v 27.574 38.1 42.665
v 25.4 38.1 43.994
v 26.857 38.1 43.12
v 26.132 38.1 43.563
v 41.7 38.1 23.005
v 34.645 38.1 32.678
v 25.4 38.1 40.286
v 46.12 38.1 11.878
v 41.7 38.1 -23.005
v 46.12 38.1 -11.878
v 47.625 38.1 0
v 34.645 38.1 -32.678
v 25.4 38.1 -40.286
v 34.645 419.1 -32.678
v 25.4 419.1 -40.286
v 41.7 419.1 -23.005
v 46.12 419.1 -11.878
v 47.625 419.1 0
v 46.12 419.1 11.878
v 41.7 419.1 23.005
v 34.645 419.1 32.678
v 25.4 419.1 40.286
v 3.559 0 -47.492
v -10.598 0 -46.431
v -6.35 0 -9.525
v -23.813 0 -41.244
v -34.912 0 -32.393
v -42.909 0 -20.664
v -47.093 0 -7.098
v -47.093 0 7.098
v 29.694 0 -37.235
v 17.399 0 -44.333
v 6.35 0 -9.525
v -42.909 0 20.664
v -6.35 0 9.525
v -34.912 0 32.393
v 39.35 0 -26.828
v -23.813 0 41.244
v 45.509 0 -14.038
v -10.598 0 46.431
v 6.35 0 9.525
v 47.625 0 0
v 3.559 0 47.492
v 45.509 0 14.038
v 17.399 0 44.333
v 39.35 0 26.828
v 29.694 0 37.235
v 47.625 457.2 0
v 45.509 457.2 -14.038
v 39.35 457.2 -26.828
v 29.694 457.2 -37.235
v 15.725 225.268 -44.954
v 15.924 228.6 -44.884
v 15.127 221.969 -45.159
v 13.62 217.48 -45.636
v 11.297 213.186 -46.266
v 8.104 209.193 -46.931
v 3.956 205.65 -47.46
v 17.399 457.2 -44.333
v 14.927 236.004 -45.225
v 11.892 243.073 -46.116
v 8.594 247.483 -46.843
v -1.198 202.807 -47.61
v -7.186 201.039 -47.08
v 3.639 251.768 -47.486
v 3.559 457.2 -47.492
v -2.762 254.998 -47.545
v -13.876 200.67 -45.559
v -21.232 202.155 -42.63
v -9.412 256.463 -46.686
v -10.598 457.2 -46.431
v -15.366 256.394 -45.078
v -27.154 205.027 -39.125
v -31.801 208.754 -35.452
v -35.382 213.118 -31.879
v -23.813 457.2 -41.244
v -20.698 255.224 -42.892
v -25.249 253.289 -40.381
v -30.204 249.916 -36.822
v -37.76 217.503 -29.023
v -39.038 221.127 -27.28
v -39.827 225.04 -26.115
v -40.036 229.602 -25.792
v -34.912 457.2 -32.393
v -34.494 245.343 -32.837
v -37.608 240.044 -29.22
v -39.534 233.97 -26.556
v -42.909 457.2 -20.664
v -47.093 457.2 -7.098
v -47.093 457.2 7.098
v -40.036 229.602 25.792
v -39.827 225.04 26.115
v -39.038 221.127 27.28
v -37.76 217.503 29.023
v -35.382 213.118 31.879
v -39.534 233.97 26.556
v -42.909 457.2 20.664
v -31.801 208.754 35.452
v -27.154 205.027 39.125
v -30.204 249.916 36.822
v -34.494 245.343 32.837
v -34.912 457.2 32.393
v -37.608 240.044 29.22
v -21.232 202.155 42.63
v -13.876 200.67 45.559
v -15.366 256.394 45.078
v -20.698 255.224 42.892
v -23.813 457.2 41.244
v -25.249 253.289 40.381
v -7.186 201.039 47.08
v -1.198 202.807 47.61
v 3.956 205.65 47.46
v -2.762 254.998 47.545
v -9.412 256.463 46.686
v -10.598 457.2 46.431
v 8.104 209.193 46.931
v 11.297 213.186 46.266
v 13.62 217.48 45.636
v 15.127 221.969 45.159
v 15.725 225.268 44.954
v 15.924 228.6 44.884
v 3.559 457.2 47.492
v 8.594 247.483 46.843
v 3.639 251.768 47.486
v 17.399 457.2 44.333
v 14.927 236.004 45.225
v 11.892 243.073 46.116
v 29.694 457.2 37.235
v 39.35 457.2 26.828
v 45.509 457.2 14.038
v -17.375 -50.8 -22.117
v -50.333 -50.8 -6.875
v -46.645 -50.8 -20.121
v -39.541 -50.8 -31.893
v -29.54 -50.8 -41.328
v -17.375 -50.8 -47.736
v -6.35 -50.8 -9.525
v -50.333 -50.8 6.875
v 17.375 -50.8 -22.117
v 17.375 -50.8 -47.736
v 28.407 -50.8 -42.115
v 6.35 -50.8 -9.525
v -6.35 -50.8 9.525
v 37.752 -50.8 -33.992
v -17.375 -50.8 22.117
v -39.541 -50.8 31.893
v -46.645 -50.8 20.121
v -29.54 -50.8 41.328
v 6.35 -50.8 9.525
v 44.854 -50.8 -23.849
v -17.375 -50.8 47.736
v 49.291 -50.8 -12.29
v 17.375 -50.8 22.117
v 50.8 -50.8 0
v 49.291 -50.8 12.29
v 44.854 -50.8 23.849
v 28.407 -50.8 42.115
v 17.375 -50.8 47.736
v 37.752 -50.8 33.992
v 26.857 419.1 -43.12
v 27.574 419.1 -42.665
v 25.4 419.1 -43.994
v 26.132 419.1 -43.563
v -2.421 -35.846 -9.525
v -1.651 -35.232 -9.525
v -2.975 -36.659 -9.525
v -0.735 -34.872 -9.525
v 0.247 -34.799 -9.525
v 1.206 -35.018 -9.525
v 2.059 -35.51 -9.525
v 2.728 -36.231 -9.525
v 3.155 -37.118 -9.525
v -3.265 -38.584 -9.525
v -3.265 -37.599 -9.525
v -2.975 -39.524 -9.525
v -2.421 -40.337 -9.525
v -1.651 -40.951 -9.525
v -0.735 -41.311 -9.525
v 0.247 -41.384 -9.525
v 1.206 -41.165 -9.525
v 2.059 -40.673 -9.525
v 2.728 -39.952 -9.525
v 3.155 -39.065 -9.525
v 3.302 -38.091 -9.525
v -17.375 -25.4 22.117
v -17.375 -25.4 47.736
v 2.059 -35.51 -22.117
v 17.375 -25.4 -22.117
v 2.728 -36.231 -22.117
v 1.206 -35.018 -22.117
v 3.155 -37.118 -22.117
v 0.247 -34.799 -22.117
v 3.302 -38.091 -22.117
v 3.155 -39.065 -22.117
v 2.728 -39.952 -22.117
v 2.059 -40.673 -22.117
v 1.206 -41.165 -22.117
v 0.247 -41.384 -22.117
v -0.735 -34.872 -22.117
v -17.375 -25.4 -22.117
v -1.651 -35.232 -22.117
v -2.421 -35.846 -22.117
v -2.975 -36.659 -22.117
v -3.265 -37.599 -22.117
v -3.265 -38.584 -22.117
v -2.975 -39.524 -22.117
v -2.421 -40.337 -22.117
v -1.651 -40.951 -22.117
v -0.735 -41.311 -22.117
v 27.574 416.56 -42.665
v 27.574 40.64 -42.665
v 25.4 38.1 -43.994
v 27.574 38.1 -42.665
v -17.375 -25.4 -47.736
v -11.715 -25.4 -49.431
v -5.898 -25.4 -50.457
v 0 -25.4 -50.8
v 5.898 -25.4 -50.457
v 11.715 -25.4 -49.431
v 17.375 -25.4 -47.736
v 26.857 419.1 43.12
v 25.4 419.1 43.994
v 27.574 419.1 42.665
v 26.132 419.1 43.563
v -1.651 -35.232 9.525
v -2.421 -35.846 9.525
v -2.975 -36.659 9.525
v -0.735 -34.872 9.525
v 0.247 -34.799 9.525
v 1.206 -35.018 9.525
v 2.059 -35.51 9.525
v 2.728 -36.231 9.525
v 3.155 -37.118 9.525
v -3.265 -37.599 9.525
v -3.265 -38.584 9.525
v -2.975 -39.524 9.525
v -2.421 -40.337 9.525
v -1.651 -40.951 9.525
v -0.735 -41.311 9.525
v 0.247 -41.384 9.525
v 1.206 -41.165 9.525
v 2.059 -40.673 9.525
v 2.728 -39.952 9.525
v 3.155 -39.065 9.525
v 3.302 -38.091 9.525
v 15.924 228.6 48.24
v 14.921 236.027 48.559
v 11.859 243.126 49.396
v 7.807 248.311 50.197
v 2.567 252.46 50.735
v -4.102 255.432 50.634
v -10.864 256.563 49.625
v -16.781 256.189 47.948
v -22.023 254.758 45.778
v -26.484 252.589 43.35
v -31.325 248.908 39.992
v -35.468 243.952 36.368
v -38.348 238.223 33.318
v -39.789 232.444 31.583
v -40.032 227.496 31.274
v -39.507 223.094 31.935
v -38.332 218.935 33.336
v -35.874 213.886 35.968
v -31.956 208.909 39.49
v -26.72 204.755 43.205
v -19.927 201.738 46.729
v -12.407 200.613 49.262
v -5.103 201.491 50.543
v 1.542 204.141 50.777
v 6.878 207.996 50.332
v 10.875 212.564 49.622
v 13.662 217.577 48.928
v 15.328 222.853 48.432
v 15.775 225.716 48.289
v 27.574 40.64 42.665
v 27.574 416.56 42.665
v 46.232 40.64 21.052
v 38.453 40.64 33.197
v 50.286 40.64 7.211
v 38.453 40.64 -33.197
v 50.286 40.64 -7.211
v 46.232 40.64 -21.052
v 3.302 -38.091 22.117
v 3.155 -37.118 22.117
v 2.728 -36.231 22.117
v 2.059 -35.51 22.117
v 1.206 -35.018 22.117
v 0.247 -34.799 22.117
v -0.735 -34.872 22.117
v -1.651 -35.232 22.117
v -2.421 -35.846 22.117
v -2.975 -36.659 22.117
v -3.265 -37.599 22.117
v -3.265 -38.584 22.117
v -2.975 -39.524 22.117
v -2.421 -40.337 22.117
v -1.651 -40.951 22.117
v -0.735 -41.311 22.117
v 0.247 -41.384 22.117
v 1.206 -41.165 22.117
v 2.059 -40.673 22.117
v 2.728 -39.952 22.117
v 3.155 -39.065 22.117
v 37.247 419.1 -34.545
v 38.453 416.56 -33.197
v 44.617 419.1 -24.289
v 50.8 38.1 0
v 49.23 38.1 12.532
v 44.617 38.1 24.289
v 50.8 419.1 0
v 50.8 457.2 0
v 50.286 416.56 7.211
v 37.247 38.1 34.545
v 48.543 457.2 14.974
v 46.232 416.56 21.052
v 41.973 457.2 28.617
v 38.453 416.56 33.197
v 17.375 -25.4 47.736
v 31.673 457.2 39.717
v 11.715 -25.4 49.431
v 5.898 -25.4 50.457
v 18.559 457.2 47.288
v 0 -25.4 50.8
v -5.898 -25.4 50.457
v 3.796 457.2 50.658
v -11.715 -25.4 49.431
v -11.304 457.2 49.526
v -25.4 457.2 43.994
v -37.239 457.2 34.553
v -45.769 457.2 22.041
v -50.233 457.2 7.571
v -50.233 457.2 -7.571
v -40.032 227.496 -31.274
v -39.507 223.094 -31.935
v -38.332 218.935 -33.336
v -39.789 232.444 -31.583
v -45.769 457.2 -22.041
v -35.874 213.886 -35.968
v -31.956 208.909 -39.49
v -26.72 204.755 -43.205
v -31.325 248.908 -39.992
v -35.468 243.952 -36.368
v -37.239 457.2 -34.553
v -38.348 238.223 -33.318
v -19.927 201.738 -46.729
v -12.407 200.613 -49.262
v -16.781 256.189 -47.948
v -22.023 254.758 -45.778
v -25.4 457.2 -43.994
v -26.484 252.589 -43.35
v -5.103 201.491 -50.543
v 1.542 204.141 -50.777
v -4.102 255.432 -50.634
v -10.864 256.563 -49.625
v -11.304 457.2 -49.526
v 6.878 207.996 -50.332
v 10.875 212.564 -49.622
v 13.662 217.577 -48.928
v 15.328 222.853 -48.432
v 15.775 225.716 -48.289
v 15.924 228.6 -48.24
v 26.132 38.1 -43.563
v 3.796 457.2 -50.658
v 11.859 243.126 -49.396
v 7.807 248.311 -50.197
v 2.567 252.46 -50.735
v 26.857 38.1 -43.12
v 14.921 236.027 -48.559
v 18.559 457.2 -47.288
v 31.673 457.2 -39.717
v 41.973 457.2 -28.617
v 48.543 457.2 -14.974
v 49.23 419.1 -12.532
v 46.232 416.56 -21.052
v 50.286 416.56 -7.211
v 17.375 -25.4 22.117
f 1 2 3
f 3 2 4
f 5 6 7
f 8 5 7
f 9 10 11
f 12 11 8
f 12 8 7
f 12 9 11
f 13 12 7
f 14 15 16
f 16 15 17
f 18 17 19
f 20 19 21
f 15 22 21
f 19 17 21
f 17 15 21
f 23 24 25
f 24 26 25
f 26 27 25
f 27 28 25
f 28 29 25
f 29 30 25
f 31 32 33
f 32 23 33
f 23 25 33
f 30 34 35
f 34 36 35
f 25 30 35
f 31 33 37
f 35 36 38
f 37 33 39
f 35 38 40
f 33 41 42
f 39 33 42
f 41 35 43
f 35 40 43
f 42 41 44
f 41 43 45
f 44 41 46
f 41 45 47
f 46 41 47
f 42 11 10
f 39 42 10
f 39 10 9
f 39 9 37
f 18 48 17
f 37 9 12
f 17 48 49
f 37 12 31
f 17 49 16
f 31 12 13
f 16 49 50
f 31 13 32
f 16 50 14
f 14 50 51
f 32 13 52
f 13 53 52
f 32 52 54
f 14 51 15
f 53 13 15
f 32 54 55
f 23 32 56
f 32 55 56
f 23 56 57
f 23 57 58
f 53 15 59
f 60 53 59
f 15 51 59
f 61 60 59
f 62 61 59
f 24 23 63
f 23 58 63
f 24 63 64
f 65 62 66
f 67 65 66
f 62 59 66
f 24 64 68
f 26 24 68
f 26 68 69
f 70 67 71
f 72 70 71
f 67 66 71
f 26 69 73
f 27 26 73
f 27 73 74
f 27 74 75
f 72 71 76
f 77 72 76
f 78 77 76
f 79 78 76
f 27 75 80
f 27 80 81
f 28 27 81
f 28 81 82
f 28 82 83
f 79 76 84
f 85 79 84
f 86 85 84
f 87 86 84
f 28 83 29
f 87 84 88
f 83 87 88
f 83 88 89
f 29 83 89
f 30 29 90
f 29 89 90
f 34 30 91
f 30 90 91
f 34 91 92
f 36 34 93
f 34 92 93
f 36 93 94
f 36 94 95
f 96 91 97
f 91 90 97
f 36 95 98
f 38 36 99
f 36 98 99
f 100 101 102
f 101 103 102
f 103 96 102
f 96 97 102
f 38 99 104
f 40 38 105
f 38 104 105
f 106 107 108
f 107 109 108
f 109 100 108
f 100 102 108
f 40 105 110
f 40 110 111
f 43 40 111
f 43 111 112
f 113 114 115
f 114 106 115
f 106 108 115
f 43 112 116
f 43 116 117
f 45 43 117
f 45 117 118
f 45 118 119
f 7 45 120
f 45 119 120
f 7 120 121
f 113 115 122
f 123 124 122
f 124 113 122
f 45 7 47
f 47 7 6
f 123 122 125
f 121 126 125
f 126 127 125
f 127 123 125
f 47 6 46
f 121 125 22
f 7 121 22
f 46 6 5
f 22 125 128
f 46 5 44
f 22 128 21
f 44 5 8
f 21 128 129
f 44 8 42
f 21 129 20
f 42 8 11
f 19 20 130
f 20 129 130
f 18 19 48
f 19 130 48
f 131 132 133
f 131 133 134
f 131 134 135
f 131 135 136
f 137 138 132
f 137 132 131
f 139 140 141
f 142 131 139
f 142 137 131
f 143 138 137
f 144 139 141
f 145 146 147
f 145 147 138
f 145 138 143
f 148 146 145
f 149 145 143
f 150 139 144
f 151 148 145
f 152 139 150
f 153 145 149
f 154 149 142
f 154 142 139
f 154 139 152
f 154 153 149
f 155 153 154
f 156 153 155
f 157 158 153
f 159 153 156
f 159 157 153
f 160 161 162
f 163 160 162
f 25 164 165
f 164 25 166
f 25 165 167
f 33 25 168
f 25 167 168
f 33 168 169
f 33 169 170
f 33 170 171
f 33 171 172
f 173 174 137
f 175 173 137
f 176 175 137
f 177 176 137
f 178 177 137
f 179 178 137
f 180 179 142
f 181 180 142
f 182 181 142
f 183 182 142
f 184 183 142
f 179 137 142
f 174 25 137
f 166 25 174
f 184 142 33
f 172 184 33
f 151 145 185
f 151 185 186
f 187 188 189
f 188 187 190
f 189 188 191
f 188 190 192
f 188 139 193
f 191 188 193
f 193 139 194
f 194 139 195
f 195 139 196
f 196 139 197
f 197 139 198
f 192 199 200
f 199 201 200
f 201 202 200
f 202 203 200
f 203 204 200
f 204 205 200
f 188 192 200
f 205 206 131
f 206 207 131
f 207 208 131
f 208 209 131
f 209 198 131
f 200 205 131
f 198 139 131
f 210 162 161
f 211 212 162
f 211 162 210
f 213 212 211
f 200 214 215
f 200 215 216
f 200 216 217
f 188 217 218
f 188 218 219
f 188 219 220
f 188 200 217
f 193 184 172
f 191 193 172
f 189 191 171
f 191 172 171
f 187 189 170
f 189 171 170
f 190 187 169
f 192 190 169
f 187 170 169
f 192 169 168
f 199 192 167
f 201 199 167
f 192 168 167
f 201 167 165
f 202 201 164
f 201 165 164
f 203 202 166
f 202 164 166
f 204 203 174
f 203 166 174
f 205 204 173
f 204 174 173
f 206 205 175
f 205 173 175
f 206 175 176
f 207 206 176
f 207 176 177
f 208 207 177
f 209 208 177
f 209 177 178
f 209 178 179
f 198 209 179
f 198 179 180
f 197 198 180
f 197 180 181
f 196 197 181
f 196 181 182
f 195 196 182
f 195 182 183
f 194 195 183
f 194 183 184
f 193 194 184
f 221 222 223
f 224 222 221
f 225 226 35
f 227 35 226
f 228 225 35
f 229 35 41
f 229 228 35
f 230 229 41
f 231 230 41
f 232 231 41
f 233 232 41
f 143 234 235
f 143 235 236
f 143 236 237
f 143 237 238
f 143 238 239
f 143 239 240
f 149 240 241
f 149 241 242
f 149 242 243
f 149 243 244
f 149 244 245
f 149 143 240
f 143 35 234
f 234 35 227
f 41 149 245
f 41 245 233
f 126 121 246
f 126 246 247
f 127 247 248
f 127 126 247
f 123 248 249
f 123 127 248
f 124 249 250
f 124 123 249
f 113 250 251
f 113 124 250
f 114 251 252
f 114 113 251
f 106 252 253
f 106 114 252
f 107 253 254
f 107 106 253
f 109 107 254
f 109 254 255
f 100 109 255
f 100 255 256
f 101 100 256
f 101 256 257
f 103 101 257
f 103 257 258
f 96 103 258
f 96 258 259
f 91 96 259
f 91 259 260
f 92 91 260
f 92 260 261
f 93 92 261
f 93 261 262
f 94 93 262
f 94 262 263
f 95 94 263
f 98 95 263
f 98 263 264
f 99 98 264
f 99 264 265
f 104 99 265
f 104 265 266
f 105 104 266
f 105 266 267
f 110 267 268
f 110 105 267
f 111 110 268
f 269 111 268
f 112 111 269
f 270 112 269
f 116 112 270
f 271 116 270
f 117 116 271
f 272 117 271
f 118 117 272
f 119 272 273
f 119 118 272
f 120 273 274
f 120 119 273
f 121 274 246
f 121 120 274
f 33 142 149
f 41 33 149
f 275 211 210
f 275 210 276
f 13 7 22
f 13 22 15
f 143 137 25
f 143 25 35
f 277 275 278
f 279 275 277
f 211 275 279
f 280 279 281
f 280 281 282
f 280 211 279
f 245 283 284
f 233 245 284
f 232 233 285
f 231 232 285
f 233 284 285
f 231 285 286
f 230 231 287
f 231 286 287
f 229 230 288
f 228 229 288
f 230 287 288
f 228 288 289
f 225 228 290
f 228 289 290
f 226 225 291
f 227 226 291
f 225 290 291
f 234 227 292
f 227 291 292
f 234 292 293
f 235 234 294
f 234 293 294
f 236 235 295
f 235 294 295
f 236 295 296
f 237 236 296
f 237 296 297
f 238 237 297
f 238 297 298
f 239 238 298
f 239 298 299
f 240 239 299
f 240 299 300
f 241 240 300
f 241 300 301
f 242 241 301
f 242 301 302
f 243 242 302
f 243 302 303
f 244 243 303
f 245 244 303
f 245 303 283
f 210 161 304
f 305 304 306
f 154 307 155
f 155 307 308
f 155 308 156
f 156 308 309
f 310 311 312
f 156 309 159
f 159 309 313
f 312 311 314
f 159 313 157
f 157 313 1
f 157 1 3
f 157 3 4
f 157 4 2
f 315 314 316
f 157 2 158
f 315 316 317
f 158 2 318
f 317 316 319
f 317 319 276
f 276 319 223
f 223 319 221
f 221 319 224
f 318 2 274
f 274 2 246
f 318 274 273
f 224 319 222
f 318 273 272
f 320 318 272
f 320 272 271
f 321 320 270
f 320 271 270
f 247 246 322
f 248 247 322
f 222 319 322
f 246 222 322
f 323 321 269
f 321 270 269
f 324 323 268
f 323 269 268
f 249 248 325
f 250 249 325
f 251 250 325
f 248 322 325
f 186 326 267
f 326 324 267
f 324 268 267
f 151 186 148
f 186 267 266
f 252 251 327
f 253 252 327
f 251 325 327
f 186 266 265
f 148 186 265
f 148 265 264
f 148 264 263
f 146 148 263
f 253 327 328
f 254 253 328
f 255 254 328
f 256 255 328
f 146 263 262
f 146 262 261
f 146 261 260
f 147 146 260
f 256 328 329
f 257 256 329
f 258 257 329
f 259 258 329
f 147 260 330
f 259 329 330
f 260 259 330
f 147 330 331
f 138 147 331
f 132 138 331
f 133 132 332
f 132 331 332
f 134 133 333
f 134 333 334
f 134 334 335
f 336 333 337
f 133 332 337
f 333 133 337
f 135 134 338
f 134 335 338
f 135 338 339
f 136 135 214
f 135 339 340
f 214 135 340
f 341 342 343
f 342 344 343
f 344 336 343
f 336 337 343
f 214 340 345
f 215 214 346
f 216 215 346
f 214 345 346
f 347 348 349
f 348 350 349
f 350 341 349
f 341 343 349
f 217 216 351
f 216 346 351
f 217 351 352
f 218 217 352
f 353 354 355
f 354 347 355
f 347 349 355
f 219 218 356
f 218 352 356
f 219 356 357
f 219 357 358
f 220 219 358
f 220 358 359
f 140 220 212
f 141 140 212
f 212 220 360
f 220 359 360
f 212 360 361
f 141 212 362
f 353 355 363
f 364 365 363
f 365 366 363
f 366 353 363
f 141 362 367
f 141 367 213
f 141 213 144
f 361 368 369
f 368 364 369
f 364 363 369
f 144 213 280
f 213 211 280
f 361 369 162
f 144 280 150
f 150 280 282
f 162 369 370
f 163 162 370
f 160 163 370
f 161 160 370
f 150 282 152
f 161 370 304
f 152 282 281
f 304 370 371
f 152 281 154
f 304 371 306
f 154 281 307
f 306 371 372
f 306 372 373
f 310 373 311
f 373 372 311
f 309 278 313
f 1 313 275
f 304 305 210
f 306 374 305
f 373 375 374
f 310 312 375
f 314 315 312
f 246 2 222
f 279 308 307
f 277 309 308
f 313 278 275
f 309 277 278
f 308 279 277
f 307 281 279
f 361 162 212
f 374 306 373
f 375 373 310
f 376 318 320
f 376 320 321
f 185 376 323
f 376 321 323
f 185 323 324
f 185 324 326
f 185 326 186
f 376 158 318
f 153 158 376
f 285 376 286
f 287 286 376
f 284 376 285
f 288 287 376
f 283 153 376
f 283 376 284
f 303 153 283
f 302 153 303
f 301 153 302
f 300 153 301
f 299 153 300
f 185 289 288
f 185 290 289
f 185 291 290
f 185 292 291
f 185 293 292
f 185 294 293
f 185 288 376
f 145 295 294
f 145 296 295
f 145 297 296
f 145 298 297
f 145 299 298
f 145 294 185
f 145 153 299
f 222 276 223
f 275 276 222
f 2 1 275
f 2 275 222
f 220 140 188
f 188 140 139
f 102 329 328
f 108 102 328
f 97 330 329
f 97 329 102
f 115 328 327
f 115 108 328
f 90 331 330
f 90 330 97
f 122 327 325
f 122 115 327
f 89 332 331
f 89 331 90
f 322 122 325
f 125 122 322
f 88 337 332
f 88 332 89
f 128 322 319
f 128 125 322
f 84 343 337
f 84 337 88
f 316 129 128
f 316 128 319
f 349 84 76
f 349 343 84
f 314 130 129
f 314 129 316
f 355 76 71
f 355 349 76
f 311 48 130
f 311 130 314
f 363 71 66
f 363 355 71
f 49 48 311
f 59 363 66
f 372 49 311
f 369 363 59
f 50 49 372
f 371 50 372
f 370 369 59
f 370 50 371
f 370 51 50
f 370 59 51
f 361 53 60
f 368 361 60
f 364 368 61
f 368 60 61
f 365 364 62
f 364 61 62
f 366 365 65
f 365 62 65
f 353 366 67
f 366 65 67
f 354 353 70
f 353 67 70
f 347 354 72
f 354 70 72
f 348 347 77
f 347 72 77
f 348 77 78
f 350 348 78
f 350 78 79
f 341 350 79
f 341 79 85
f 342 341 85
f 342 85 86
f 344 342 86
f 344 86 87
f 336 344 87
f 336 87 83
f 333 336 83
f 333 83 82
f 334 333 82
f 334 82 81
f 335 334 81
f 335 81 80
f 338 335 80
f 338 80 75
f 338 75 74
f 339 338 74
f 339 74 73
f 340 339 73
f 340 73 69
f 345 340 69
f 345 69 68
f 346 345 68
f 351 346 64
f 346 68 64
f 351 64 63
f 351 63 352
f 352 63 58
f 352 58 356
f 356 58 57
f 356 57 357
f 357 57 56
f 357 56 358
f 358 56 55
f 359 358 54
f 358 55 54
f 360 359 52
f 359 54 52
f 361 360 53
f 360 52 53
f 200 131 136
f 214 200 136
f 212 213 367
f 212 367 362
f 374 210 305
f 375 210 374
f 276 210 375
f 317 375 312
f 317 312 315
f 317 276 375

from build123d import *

# Parameters (mm, degrees)
SKETCH1_R               = 50.8
BOSS_EXTRUDE1_DEPTH     = 457.2
SKETCH2_R               = 47.625
CUT_EXTRUDE1_DEPTH      = 458.2
SKETCH3_R               = 27.989032433
SKETCH3_W               = 25.4
SKETCH3_H               = 381
CUT_EXTRUDE3_DEPTH      = 51.8
CUT_EXTRUDE3_DEPTH_BACK = 51.8
BOSS_EXTRUDE2_DEPTH     = 381
SKETCH6_R               = 50.8
BOSS_EXTRUDE3_DEPTH     = 50.8
CUT_EXTRUDE4_DEPTH      = 25.4
SKETCH8_R               = 3.302
CUT_EXTRUDE5_DEPTH      = 73.916768016
BOSS_EXTRUDE4_DEPTH     = 2.54
BOSS_EXTRUDE5_DEPTH     = 2.54
SKETCH26_W              = 12.7
SKETCH26_H              = 19.05
CUT_EXTRUDE6_DEPTH      = 84.582


with BuildPart() as part:
    # Sketch1 → Boss-Extrude1 (new body)
    with BuildSketch(Plane(origin=(0, 0, 0), x_dir=(1, 0, 0), z_dir=(0, 1, 0))):
        Circle(SKETCH1_R)
    extrude(amount=BOSS_EXTRUDE1_DEPTH)

    # Sketch2 → Cut-Extrude1 (cut, through all)
    with BuildSketch(Plane(origin=(0, 457.2, 0), x_dir=(1, 0, 0), z_dir=(0, 1, 0))):
        Circle(SKETCH2_R)
    extrude(amount=-CUT_EXTRUDE1_DEPTH, mode=Mode.SUBTRACT)

    # Sketch3 → Cut-Extrude3 (cut, two sides)
    with BuildSketch(Plane.XY) as cut_extrude3_sk:
        with Locations((-12.065, 228.6)):
            Circle(SKETCH3_R)
        with Locations((38.1, 228.6)):
            Rectangle(SKETCH3_W, SKETCH3_H)
    extrude(amount=CUT_EXTRUDE3_DEPTH, mode=Mode.SUBTRACT)
    extrude(cut_extrude3_sk.sketch, amount=-CUT_EXTRUDE3_DEPTH_BACK, mode=Mode.SUBTRACT)

    # Sketch5 → Boss-Extrude2 (add)
    with BuildSketch(Plane(origin=(0, 38.1, 0), x_dir=(1, 0, 0), z_dir=(0, 1, 0))):
        Polygon((25.4, -43.994090512), (25.4, 43.994090512), (27.573729132, 42.665319192), (27.573729132, -42.665319192), align=None)
    extrude(amount=BOSS_EXTRUDE2_DEPTH)

    # Sketch6 → Boss-Extrude3 (add)
    with BuildSketch(Plane.XZ):
        Circle(SKETCH6_R)
    extrude(amount=BOSS_EXTRUDE3_DEPTH)

    # Sketch7 → Cut-Extrude4 (cut)
    with BuildSketch(Plane.XZ.offset(50.8)):
        with BuildLine():
            Line((17.374623281, 47.736385136), (17.374623281, 22.116767912))
            Line((17.374623281, 22.116767912), (-17.374623281, 22.116767912))
            Line((-17.374623281, 22.116767912), (-17.374623281, 47.736385136))
            ThreePointArc((-17.374623281, 47.736385136), (-8.821327425, 50.028233853), (0, 50.8))
            ThreePointArc((0, 50.8), (8.821327425, 50.028233853), (17.374623281, 47.736385136))
        make_face()
        with BuildLine():
            Line((17.374623281, -22.116767912), (-17.374623281, -22.116767912))
            Line((-17.374623281, -22.116767912), (-17.374623281, -47.736385136))
            ThreePointArc((-17.374623281, -47.736385136), (-8.821327425, -50.028233853), (0, -50.8))
            ThreePointArc((0, -50.8), (8.821327425, -50.028233853), (17.374623281, -47.736385136))
            Line((17.374623281, -47.736385136), (17.374623281, -22.116767912))
        make_face()
    extrude(amount=-CUT_EXTRUDE4_DEPTH, mode=Mode.SUBTRACT)

    # Sketch8 → Cut-Extrude5 (cut, through all)
    with BuildSketch(Plane.XY.offset(22.116767912)):
        with Locations((0, -38.091466754)):
            Circle(SKETCH8_R)
    extrude(amount=-CUT_EXTRUDE5_DEPTH, mode=Mode.SUBTRACT)

    # Sketch9 → Boss-Extrude4 (add)
    with BuildSketch(Plane(origin=(0, 38.1, 0), x_dir=(1, 0, 0), z_dir=(0, 1, 0))):
        with BuildLine():
            Line((27.573729132, 42.665319192), (27.573729132, -42.665319192))
            ThreePointArc((27.573729132, -42.665319192), (50.8, 0), (27.573729132, 42.665319192))
        make_face()
    extrude(amount=BOSS_EXTRUDE4_DEPTH)

    # Sketch10 → Boss-Extrude5 (add)
    with BuildSketch(Plane.XZ.offset(-419.1)):
        with BuildLine():
            Line((27.573729132, 42.665319192), (27.573729132, -42.665319192))
            ThreePointArc((27.573729132, -42.665319192), (50.8, 0), (27.573729132, 42.665319192))
        make_face()
    extrude(amount=BOSS_EXTRUDE5_DEPTH)

    # Sketch26 → Cut-Extrude6 (cut)
    with BuildSketch(Plane.XZ.offset(50.8)):
        Rectangle(SKETCH26_W, SKETCH26_H)
    extrude(amount=-CUT_EXTRUDE6_DEPTH, mode=Mode.SUBTRACT)


solid = part.part
